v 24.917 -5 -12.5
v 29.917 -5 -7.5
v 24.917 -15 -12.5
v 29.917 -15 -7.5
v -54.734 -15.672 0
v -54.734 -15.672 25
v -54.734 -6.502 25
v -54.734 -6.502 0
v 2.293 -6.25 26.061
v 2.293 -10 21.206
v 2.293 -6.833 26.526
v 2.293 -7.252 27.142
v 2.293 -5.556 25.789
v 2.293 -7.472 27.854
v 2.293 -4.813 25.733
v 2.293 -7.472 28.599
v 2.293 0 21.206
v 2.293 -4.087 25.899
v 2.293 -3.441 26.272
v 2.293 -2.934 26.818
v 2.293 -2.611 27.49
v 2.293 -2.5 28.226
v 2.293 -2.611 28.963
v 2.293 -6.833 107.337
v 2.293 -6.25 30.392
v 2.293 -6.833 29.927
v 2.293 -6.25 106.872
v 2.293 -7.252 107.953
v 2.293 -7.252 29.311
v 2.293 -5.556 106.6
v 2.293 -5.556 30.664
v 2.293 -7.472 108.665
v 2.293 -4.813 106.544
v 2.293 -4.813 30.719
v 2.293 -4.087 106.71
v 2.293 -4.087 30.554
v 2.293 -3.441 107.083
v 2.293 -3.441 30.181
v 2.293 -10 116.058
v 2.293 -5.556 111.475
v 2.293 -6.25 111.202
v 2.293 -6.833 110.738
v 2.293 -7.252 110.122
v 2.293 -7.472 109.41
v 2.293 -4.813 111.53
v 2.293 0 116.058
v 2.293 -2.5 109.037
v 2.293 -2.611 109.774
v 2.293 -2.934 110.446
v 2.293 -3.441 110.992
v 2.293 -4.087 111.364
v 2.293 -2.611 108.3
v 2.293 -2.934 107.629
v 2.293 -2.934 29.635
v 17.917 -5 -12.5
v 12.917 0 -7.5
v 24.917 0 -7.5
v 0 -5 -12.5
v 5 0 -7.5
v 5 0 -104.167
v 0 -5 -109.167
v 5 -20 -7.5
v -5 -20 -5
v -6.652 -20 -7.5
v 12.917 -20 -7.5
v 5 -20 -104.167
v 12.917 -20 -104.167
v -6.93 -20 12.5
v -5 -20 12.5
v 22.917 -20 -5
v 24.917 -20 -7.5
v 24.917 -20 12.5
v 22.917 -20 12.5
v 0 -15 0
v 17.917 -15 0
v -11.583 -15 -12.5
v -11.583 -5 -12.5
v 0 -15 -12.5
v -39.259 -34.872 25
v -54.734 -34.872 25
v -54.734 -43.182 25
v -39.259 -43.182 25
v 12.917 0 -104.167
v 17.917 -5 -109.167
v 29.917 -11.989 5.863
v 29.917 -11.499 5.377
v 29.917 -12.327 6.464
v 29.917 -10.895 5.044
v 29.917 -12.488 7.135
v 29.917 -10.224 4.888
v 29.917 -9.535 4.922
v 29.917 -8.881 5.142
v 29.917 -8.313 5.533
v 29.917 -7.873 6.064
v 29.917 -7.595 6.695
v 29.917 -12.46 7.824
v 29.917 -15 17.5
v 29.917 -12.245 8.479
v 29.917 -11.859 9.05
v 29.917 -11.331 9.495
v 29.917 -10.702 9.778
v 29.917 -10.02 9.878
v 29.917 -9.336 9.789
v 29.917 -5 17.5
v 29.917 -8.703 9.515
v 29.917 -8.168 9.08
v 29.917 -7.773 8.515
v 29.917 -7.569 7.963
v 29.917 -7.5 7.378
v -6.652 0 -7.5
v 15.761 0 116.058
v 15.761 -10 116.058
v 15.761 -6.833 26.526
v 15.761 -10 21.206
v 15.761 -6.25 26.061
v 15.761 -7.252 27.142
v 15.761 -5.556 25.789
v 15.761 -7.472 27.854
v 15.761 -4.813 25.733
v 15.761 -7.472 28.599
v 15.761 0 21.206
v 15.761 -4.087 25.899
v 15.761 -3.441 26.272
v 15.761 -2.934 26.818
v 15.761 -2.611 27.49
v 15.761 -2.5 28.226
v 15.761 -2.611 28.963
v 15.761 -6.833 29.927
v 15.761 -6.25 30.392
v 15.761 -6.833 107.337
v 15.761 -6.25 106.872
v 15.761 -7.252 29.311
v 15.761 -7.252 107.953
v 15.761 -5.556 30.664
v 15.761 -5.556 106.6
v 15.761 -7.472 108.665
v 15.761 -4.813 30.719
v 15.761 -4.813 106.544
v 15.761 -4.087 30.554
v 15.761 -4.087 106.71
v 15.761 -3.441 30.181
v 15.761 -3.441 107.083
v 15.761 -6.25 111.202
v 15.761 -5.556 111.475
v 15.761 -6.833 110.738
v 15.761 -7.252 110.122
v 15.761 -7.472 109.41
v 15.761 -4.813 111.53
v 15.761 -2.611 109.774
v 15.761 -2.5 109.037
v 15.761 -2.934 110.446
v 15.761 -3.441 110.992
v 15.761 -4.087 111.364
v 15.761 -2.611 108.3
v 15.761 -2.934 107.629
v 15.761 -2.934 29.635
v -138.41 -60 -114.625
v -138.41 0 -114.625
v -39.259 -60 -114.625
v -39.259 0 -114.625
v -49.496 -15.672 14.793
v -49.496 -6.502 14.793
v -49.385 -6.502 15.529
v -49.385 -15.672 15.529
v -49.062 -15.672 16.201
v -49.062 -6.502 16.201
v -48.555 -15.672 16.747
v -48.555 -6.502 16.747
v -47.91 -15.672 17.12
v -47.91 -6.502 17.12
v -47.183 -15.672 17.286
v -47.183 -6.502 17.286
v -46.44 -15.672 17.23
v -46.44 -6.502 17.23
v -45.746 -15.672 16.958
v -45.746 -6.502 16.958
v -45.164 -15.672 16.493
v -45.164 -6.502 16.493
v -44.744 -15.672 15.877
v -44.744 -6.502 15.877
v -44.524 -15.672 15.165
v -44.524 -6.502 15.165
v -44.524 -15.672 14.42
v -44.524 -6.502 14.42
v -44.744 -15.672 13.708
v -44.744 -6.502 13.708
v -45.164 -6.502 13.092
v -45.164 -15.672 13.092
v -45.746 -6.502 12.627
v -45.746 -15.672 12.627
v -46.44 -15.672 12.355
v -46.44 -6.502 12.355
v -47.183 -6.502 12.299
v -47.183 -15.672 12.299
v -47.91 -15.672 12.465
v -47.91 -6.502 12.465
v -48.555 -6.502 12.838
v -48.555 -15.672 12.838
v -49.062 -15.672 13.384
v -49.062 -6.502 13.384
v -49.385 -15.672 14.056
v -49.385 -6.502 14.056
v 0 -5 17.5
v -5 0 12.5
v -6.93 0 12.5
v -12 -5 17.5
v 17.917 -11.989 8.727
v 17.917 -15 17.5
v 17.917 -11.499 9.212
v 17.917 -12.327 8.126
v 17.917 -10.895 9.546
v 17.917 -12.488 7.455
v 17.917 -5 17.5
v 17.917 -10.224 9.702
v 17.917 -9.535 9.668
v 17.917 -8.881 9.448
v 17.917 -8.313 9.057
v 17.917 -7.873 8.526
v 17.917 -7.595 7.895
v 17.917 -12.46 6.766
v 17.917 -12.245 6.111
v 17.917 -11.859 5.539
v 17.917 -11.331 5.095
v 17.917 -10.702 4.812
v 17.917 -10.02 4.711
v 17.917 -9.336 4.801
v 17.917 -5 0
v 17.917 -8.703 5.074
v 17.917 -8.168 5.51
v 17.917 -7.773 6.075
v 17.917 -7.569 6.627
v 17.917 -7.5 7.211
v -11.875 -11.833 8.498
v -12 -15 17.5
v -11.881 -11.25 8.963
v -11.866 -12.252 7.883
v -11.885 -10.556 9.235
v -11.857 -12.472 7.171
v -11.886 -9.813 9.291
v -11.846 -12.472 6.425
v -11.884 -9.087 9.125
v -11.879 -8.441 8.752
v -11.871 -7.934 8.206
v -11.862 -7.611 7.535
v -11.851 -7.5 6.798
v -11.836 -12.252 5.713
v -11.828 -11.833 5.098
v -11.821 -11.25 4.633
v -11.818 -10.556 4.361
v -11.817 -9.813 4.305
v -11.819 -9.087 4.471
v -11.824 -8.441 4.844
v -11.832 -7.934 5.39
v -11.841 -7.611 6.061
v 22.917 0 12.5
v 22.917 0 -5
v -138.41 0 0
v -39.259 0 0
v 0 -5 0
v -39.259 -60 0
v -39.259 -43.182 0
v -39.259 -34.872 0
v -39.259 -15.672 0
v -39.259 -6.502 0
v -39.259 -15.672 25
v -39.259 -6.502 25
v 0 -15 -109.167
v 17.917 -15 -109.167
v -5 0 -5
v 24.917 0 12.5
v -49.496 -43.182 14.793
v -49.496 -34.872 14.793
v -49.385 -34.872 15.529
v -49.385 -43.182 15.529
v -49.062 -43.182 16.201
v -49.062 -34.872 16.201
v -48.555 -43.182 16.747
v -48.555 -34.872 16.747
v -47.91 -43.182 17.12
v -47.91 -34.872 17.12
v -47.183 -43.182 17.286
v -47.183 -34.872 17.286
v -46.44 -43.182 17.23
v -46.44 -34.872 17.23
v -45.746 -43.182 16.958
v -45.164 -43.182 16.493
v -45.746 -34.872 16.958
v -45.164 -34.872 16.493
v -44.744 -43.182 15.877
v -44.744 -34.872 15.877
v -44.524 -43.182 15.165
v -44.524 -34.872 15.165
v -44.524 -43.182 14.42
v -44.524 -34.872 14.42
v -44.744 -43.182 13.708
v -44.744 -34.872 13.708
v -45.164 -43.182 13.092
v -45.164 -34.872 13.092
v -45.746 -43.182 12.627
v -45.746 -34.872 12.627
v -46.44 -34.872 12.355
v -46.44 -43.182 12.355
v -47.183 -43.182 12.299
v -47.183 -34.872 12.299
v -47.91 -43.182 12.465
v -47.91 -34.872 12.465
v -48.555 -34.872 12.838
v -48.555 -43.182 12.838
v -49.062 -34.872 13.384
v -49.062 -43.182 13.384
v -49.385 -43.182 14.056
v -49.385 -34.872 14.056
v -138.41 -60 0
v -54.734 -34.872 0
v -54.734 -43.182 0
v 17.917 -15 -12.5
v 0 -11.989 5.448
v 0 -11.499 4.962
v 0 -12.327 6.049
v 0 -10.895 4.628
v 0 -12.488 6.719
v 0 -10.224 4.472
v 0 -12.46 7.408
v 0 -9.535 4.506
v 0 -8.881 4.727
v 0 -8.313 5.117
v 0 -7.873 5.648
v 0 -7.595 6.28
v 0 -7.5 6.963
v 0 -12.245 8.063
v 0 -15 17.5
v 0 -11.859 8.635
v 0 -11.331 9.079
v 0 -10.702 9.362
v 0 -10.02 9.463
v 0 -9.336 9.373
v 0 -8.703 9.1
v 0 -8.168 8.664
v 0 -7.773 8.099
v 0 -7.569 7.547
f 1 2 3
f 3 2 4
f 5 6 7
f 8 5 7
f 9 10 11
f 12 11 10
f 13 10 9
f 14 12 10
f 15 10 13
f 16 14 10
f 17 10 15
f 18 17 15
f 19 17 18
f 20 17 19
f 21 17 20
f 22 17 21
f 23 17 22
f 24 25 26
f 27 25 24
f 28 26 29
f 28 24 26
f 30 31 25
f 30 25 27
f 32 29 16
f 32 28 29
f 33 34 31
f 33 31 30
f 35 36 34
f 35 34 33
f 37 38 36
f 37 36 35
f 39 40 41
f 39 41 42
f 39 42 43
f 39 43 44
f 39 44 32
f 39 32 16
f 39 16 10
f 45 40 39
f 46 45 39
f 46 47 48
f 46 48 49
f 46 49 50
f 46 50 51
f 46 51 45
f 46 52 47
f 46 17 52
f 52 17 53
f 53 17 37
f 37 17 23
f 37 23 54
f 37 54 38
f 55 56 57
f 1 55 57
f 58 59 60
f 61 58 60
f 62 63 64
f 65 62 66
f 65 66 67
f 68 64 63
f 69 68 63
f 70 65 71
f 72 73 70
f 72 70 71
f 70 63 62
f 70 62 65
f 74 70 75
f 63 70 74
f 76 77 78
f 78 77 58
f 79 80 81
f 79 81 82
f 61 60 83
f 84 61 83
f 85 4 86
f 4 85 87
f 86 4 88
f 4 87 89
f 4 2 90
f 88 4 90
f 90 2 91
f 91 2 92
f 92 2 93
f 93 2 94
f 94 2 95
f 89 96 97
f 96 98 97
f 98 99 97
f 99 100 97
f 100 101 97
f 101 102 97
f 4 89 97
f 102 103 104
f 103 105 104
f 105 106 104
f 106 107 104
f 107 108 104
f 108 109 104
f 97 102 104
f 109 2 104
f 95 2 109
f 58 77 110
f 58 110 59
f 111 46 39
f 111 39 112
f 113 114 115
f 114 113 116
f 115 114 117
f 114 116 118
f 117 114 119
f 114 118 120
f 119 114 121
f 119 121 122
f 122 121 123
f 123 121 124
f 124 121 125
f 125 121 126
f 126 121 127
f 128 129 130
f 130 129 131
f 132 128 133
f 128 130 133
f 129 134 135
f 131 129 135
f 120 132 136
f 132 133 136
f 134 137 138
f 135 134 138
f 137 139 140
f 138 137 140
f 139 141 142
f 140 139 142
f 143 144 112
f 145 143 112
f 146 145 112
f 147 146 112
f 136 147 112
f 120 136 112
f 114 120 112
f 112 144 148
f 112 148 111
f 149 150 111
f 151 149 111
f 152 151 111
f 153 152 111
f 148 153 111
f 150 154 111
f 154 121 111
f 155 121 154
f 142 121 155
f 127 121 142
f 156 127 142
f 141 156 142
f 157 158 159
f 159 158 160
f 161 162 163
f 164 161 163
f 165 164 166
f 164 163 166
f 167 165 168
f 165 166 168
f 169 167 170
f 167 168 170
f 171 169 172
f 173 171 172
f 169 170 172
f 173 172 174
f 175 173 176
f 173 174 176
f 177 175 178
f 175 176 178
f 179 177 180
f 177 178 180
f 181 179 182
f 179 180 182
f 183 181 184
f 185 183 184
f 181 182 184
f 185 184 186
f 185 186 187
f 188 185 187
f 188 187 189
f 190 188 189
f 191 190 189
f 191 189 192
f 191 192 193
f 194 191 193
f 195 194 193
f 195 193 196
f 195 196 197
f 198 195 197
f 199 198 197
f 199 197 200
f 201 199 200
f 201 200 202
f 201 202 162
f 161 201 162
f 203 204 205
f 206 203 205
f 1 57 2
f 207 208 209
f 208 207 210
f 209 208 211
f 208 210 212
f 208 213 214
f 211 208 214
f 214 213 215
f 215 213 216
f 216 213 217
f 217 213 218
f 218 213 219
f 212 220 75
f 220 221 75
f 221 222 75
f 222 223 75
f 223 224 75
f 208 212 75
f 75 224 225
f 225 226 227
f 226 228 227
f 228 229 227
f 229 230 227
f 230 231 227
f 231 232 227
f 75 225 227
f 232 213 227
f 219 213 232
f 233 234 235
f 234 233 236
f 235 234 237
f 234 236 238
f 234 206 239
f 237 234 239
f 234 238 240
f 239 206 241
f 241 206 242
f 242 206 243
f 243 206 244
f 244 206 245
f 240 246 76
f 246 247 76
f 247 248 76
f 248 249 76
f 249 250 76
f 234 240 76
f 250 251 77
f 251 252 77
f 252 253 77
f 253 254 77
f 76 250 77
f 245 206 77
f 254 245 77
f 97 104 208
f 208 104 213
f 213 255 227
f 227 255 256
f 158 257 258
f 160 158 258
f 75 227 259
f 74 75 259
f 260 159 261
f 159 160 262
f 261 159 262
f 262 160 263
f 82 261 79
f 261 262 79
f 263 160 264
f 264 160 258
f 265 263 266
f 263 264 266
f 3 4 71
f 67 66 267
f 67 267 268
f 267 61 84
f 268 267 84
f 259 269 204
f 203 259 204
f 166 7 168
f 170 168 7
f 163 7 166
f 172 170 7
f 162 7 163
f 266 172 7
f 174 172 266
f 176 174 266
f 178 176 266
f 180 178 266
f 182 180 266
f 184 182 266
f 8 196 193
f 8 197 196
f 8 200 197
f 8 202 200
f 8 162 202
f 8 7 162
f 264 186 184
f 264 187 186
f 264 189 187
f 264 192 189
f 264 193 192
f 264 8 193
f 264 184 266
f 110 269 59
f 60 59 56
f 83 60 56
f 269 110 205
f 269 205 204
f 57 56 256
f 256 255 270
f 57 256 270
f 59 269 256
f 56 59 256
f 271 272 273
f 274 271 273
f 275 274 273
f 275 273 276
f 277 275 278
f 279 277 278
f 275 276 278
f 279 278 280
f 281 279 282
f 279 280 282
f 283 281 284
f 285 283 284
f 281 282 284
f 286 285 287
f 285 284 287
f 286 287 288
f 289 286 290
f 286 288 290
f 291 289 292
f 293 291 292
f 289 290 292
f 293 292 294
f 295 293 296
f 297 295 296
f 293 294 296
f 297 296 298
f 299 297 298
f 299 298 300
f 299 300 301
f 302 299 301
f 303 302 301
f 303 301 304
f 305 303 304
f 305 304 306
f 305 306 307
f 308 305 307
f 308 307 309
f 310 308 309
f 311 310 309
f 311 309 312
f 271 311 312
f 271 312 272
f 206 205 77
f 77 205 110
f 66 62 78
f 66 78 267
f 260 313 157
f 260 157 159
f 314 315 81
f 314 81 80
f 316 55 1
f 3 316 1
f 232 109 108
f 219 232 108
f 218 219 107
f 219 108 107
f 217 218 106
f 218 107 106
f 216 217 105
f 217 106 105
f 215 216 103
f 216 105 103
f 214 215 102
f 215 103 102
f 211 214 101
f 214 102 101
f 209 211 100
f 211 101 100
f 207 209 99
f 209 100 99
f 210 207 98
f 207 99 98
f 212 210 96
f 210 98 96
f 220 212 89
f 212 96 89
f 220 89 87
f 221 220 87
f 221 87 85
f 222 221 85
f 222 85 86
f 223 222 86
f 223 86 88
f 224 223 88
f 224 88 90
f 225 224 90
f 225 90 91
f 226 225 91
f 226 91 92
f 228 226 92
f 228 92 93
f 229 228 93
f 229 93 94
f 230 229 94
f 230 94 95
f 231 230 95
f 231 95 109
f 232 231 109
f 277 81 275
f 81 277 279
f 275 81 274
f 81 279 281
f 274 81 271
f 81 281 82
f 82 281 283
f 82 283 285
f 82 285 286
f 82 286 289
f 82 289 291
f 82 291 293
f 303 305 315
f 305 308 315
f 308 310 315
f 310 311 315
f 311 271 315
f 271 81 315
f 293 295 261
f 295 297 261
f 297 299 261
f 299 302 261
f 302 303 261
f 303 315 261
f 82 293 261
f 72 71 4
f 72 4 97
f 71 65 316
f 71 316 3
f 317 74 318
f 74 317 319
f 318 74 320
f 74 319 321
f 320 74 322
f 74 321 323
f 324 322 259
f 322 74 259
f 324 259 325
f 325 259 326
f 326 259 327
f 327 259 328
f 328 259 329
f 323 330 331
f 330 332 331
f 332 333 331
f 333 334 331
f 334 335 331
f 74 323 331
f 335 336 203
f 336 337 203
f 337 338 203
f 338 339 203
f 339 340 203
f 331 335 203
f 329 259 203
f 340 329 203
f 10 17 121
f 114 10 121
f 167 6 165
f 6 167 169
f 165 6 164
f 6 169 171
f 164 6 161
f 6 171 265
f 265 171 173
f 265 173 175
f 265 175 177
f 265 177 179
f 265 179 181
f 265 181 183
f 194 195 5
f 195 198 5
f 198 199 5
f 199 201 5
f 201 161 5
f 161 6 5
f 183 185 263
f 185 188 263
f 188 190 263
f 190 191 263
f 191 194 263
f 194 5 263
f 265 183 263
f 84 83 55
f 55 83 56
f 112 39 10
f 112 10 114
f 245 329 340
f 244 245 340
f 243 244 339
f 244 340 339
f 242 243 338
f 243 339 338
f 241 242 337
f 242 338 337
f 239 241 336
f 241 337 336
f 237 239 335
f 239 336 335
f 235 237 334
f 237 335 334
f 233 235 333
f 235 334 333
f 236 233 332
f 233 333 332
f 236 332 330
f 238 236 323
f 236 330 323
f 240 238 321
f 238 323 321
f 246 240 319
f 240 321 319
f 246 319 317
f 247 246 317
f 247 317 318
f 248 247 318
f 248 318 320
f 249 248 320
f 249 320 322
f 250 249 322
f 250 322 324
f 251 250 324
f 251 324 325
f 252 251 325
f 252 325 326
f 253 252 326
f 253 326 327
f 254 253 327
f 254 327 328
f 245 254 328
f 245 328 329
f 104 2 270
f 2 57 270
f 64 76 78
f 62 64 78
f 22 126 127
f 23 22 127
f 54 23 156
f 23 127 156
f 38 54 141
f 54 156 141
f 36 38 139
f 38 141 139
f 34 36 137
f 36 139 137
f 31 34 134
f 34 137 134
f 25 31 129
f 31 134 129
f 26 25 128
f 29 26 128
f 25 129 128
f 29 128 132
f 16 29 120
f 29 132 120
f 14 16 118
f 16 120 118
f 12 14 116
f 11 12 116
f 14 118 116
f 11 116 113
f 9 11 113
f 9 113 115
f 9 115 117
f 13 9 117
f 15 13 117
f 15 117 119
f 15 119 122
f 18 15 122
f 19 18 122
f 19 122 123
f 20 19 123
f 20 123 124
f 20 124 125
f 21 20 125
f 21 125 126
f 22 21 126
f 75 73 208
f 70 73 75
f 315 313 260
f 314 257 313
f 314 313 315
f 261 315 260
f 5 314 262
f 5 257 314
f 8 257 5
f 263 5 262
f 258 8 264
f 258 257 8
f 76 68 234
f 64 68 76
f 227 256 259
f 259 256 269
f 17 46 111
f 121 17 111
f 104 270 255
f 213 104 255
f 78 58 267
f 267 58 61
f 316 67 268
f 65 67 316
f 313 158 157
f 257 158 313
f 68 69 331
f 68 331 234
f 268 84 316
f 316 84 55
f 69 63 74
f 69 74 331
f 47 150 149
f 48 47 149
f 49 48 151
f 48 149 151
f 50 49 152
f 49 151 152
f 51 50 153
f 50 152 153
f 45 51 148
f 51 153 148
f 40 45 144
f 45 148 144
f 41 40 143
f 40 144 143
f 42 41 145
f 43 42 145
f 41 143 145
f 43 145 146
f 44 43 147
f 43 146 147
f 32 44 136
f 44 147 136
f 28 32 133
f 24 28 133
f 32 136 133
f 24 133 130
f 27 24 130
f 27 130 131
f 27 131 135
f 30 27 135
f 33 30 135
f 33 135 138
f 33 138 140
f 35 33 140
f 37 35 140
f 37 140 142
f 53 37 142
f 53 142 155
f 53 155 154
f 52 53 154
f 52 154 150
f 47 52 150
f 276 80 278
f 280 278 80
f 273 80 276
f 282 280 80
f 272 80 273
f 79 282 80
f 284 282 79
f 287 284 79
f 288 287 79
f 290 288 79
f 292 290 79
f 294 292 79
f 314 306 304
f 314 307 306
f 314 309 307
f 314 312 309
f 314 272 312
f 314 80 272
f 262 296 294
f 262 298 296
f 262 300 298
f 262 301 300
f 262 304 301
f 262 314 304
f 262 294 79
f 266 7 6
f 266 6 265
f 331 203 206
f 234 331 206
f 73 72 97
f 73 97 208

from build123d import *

# Parameters (mm, degrees)
F1_DEPTH  = 20
F2_SIZE   = 5
F4_D      = 5
F5_W      = 13.4684653021
F5_H      = 94.8523897678
F6_DEPTH  = 10
F8_D      = 5
F9_W      = 99.1508290172
F9_H      = 114.6252378821
F10_DEPTH = 60
F11_W     = 15.4744051397
F11_H     = 9.1700186022
F11_H_2   = 8.310329169
F12_DEPTH = 25
F14_D     = 5


with BuildPart() as f1:
    # F0 (on Front) → F1 (new body)
    with BuildSketch(Plane.XZ):
        Polygon((0, 17.4999950348), (-12, 17.4999950348), (-11.5833330324, -12.5000049652), (0, -12.5000049652), (0, -109.1666778008), (17.9166687731, -109.1666778008), (17.9166687731, -12.5000049652), (29.9166687731, -12.5000049652), (29.9166687731, 17.4999950348), (17.9166687731, 17.4999950348), (17.9166687731, 0), (0, 0), align=None)
    extrude(amount=F1_DEPTH)

    # F2
    f2_edges = [f1.edges().sort_by_distance(p)[0] for p in [
        (29.916669, 0, 2.499995),
        (23.916669, 0, 17.499995),
        (17.916669, 0, 8.749998),
        (8.958334, 0, 0),
        (0, 0, 8.749998),
        (-6, 0, 17.499995),
        (-11.791667, 0, 2.499995),
        (-5.791667, 0, -12.500005),
        (0, 0, -60.833341),
        (8.958334, 0, -109.166678),
        (17.916669, 0, -60.833341),
        (23.916669, 0, -12.500005),
        (29.916669, -10, -12.500005),
        (29.916669, -20, 2.499995),
        (23.916669, -20, 17.499995),
        (17.916669, -20, 8.749998),
        (8.958334, -20, 0),
        (0, -20, 8.749998),
        (-6, -20, 17.499995),
        (-11.791667, -20, 2.499995),
        (-5.791667, -20, -12.500005),
        (0, -20, -60.833341),
        (8.958334, -20, -109.166678),
        (17.916669, -20, -60.833341),
        (23.916669, -20, -12.500005),
    ]]
    chamfer(f2_edges, length=F2_SIZE)

    # F4 (through all)
    with Locations(Plane(origin=(-11.7546768429, 0, -0.1632595185), x_dir=(0, -1, 0), z_dir=(-0.9999035632, 0, -0.0138875595))):
        with Locations((10, 6.9619570859)):
            Hole(F4_D / 2)


with BuildPart() as f6:
    # F5 (on Front) → F6 (new body)
    with BuildSketch(Plane.XZ):
        with Locations((9.0267385822, 68.6318641528)):
            Rectangle(F5_W, F5_H)
    extrude(amount=F6_DEPTH)

    # F8 (through all)
    with Locations(Plane(origin=(2.2925059311, 0, 0), x_dir=(0, -1, 0), z_dir=(-1, 0, 0))):
        with Locations((5, 109.0372651815), (5, 28.2264668494)):
            Hole(F8_D / 2)


with BuildPart() as f10:
    # F9 (on Front) → F10 (new body)
    with BuildSketch(Plane.XZ):
        with Locations((-88.8345576823, -57.3126189411)):
            Rectangle(F9_W, F9_H)
    extrude(amount=F10_DEPTH)

    # F11 (on face) → F12 (join)
    with BuildSketch(Plane.XY):
        with Locations((-46.9963457435, -11.0868343618)):
            Rectangle(F11_W, F11_H)
        with Locations((-46.9963457435, -39.0267390758)):
            Rectangle(F11_W, F11_H_2)
    extrude(amount=F12_DEPTH)

    # F14 (through all)
    with Locations(Plane.XZ.offset(43.1819036603)):
        with Locations((-46.9963457435, 14.7925047204)):
            Hole(F14_D / 2)


solid = Compound([f1.part, f6.part, f10.part])
